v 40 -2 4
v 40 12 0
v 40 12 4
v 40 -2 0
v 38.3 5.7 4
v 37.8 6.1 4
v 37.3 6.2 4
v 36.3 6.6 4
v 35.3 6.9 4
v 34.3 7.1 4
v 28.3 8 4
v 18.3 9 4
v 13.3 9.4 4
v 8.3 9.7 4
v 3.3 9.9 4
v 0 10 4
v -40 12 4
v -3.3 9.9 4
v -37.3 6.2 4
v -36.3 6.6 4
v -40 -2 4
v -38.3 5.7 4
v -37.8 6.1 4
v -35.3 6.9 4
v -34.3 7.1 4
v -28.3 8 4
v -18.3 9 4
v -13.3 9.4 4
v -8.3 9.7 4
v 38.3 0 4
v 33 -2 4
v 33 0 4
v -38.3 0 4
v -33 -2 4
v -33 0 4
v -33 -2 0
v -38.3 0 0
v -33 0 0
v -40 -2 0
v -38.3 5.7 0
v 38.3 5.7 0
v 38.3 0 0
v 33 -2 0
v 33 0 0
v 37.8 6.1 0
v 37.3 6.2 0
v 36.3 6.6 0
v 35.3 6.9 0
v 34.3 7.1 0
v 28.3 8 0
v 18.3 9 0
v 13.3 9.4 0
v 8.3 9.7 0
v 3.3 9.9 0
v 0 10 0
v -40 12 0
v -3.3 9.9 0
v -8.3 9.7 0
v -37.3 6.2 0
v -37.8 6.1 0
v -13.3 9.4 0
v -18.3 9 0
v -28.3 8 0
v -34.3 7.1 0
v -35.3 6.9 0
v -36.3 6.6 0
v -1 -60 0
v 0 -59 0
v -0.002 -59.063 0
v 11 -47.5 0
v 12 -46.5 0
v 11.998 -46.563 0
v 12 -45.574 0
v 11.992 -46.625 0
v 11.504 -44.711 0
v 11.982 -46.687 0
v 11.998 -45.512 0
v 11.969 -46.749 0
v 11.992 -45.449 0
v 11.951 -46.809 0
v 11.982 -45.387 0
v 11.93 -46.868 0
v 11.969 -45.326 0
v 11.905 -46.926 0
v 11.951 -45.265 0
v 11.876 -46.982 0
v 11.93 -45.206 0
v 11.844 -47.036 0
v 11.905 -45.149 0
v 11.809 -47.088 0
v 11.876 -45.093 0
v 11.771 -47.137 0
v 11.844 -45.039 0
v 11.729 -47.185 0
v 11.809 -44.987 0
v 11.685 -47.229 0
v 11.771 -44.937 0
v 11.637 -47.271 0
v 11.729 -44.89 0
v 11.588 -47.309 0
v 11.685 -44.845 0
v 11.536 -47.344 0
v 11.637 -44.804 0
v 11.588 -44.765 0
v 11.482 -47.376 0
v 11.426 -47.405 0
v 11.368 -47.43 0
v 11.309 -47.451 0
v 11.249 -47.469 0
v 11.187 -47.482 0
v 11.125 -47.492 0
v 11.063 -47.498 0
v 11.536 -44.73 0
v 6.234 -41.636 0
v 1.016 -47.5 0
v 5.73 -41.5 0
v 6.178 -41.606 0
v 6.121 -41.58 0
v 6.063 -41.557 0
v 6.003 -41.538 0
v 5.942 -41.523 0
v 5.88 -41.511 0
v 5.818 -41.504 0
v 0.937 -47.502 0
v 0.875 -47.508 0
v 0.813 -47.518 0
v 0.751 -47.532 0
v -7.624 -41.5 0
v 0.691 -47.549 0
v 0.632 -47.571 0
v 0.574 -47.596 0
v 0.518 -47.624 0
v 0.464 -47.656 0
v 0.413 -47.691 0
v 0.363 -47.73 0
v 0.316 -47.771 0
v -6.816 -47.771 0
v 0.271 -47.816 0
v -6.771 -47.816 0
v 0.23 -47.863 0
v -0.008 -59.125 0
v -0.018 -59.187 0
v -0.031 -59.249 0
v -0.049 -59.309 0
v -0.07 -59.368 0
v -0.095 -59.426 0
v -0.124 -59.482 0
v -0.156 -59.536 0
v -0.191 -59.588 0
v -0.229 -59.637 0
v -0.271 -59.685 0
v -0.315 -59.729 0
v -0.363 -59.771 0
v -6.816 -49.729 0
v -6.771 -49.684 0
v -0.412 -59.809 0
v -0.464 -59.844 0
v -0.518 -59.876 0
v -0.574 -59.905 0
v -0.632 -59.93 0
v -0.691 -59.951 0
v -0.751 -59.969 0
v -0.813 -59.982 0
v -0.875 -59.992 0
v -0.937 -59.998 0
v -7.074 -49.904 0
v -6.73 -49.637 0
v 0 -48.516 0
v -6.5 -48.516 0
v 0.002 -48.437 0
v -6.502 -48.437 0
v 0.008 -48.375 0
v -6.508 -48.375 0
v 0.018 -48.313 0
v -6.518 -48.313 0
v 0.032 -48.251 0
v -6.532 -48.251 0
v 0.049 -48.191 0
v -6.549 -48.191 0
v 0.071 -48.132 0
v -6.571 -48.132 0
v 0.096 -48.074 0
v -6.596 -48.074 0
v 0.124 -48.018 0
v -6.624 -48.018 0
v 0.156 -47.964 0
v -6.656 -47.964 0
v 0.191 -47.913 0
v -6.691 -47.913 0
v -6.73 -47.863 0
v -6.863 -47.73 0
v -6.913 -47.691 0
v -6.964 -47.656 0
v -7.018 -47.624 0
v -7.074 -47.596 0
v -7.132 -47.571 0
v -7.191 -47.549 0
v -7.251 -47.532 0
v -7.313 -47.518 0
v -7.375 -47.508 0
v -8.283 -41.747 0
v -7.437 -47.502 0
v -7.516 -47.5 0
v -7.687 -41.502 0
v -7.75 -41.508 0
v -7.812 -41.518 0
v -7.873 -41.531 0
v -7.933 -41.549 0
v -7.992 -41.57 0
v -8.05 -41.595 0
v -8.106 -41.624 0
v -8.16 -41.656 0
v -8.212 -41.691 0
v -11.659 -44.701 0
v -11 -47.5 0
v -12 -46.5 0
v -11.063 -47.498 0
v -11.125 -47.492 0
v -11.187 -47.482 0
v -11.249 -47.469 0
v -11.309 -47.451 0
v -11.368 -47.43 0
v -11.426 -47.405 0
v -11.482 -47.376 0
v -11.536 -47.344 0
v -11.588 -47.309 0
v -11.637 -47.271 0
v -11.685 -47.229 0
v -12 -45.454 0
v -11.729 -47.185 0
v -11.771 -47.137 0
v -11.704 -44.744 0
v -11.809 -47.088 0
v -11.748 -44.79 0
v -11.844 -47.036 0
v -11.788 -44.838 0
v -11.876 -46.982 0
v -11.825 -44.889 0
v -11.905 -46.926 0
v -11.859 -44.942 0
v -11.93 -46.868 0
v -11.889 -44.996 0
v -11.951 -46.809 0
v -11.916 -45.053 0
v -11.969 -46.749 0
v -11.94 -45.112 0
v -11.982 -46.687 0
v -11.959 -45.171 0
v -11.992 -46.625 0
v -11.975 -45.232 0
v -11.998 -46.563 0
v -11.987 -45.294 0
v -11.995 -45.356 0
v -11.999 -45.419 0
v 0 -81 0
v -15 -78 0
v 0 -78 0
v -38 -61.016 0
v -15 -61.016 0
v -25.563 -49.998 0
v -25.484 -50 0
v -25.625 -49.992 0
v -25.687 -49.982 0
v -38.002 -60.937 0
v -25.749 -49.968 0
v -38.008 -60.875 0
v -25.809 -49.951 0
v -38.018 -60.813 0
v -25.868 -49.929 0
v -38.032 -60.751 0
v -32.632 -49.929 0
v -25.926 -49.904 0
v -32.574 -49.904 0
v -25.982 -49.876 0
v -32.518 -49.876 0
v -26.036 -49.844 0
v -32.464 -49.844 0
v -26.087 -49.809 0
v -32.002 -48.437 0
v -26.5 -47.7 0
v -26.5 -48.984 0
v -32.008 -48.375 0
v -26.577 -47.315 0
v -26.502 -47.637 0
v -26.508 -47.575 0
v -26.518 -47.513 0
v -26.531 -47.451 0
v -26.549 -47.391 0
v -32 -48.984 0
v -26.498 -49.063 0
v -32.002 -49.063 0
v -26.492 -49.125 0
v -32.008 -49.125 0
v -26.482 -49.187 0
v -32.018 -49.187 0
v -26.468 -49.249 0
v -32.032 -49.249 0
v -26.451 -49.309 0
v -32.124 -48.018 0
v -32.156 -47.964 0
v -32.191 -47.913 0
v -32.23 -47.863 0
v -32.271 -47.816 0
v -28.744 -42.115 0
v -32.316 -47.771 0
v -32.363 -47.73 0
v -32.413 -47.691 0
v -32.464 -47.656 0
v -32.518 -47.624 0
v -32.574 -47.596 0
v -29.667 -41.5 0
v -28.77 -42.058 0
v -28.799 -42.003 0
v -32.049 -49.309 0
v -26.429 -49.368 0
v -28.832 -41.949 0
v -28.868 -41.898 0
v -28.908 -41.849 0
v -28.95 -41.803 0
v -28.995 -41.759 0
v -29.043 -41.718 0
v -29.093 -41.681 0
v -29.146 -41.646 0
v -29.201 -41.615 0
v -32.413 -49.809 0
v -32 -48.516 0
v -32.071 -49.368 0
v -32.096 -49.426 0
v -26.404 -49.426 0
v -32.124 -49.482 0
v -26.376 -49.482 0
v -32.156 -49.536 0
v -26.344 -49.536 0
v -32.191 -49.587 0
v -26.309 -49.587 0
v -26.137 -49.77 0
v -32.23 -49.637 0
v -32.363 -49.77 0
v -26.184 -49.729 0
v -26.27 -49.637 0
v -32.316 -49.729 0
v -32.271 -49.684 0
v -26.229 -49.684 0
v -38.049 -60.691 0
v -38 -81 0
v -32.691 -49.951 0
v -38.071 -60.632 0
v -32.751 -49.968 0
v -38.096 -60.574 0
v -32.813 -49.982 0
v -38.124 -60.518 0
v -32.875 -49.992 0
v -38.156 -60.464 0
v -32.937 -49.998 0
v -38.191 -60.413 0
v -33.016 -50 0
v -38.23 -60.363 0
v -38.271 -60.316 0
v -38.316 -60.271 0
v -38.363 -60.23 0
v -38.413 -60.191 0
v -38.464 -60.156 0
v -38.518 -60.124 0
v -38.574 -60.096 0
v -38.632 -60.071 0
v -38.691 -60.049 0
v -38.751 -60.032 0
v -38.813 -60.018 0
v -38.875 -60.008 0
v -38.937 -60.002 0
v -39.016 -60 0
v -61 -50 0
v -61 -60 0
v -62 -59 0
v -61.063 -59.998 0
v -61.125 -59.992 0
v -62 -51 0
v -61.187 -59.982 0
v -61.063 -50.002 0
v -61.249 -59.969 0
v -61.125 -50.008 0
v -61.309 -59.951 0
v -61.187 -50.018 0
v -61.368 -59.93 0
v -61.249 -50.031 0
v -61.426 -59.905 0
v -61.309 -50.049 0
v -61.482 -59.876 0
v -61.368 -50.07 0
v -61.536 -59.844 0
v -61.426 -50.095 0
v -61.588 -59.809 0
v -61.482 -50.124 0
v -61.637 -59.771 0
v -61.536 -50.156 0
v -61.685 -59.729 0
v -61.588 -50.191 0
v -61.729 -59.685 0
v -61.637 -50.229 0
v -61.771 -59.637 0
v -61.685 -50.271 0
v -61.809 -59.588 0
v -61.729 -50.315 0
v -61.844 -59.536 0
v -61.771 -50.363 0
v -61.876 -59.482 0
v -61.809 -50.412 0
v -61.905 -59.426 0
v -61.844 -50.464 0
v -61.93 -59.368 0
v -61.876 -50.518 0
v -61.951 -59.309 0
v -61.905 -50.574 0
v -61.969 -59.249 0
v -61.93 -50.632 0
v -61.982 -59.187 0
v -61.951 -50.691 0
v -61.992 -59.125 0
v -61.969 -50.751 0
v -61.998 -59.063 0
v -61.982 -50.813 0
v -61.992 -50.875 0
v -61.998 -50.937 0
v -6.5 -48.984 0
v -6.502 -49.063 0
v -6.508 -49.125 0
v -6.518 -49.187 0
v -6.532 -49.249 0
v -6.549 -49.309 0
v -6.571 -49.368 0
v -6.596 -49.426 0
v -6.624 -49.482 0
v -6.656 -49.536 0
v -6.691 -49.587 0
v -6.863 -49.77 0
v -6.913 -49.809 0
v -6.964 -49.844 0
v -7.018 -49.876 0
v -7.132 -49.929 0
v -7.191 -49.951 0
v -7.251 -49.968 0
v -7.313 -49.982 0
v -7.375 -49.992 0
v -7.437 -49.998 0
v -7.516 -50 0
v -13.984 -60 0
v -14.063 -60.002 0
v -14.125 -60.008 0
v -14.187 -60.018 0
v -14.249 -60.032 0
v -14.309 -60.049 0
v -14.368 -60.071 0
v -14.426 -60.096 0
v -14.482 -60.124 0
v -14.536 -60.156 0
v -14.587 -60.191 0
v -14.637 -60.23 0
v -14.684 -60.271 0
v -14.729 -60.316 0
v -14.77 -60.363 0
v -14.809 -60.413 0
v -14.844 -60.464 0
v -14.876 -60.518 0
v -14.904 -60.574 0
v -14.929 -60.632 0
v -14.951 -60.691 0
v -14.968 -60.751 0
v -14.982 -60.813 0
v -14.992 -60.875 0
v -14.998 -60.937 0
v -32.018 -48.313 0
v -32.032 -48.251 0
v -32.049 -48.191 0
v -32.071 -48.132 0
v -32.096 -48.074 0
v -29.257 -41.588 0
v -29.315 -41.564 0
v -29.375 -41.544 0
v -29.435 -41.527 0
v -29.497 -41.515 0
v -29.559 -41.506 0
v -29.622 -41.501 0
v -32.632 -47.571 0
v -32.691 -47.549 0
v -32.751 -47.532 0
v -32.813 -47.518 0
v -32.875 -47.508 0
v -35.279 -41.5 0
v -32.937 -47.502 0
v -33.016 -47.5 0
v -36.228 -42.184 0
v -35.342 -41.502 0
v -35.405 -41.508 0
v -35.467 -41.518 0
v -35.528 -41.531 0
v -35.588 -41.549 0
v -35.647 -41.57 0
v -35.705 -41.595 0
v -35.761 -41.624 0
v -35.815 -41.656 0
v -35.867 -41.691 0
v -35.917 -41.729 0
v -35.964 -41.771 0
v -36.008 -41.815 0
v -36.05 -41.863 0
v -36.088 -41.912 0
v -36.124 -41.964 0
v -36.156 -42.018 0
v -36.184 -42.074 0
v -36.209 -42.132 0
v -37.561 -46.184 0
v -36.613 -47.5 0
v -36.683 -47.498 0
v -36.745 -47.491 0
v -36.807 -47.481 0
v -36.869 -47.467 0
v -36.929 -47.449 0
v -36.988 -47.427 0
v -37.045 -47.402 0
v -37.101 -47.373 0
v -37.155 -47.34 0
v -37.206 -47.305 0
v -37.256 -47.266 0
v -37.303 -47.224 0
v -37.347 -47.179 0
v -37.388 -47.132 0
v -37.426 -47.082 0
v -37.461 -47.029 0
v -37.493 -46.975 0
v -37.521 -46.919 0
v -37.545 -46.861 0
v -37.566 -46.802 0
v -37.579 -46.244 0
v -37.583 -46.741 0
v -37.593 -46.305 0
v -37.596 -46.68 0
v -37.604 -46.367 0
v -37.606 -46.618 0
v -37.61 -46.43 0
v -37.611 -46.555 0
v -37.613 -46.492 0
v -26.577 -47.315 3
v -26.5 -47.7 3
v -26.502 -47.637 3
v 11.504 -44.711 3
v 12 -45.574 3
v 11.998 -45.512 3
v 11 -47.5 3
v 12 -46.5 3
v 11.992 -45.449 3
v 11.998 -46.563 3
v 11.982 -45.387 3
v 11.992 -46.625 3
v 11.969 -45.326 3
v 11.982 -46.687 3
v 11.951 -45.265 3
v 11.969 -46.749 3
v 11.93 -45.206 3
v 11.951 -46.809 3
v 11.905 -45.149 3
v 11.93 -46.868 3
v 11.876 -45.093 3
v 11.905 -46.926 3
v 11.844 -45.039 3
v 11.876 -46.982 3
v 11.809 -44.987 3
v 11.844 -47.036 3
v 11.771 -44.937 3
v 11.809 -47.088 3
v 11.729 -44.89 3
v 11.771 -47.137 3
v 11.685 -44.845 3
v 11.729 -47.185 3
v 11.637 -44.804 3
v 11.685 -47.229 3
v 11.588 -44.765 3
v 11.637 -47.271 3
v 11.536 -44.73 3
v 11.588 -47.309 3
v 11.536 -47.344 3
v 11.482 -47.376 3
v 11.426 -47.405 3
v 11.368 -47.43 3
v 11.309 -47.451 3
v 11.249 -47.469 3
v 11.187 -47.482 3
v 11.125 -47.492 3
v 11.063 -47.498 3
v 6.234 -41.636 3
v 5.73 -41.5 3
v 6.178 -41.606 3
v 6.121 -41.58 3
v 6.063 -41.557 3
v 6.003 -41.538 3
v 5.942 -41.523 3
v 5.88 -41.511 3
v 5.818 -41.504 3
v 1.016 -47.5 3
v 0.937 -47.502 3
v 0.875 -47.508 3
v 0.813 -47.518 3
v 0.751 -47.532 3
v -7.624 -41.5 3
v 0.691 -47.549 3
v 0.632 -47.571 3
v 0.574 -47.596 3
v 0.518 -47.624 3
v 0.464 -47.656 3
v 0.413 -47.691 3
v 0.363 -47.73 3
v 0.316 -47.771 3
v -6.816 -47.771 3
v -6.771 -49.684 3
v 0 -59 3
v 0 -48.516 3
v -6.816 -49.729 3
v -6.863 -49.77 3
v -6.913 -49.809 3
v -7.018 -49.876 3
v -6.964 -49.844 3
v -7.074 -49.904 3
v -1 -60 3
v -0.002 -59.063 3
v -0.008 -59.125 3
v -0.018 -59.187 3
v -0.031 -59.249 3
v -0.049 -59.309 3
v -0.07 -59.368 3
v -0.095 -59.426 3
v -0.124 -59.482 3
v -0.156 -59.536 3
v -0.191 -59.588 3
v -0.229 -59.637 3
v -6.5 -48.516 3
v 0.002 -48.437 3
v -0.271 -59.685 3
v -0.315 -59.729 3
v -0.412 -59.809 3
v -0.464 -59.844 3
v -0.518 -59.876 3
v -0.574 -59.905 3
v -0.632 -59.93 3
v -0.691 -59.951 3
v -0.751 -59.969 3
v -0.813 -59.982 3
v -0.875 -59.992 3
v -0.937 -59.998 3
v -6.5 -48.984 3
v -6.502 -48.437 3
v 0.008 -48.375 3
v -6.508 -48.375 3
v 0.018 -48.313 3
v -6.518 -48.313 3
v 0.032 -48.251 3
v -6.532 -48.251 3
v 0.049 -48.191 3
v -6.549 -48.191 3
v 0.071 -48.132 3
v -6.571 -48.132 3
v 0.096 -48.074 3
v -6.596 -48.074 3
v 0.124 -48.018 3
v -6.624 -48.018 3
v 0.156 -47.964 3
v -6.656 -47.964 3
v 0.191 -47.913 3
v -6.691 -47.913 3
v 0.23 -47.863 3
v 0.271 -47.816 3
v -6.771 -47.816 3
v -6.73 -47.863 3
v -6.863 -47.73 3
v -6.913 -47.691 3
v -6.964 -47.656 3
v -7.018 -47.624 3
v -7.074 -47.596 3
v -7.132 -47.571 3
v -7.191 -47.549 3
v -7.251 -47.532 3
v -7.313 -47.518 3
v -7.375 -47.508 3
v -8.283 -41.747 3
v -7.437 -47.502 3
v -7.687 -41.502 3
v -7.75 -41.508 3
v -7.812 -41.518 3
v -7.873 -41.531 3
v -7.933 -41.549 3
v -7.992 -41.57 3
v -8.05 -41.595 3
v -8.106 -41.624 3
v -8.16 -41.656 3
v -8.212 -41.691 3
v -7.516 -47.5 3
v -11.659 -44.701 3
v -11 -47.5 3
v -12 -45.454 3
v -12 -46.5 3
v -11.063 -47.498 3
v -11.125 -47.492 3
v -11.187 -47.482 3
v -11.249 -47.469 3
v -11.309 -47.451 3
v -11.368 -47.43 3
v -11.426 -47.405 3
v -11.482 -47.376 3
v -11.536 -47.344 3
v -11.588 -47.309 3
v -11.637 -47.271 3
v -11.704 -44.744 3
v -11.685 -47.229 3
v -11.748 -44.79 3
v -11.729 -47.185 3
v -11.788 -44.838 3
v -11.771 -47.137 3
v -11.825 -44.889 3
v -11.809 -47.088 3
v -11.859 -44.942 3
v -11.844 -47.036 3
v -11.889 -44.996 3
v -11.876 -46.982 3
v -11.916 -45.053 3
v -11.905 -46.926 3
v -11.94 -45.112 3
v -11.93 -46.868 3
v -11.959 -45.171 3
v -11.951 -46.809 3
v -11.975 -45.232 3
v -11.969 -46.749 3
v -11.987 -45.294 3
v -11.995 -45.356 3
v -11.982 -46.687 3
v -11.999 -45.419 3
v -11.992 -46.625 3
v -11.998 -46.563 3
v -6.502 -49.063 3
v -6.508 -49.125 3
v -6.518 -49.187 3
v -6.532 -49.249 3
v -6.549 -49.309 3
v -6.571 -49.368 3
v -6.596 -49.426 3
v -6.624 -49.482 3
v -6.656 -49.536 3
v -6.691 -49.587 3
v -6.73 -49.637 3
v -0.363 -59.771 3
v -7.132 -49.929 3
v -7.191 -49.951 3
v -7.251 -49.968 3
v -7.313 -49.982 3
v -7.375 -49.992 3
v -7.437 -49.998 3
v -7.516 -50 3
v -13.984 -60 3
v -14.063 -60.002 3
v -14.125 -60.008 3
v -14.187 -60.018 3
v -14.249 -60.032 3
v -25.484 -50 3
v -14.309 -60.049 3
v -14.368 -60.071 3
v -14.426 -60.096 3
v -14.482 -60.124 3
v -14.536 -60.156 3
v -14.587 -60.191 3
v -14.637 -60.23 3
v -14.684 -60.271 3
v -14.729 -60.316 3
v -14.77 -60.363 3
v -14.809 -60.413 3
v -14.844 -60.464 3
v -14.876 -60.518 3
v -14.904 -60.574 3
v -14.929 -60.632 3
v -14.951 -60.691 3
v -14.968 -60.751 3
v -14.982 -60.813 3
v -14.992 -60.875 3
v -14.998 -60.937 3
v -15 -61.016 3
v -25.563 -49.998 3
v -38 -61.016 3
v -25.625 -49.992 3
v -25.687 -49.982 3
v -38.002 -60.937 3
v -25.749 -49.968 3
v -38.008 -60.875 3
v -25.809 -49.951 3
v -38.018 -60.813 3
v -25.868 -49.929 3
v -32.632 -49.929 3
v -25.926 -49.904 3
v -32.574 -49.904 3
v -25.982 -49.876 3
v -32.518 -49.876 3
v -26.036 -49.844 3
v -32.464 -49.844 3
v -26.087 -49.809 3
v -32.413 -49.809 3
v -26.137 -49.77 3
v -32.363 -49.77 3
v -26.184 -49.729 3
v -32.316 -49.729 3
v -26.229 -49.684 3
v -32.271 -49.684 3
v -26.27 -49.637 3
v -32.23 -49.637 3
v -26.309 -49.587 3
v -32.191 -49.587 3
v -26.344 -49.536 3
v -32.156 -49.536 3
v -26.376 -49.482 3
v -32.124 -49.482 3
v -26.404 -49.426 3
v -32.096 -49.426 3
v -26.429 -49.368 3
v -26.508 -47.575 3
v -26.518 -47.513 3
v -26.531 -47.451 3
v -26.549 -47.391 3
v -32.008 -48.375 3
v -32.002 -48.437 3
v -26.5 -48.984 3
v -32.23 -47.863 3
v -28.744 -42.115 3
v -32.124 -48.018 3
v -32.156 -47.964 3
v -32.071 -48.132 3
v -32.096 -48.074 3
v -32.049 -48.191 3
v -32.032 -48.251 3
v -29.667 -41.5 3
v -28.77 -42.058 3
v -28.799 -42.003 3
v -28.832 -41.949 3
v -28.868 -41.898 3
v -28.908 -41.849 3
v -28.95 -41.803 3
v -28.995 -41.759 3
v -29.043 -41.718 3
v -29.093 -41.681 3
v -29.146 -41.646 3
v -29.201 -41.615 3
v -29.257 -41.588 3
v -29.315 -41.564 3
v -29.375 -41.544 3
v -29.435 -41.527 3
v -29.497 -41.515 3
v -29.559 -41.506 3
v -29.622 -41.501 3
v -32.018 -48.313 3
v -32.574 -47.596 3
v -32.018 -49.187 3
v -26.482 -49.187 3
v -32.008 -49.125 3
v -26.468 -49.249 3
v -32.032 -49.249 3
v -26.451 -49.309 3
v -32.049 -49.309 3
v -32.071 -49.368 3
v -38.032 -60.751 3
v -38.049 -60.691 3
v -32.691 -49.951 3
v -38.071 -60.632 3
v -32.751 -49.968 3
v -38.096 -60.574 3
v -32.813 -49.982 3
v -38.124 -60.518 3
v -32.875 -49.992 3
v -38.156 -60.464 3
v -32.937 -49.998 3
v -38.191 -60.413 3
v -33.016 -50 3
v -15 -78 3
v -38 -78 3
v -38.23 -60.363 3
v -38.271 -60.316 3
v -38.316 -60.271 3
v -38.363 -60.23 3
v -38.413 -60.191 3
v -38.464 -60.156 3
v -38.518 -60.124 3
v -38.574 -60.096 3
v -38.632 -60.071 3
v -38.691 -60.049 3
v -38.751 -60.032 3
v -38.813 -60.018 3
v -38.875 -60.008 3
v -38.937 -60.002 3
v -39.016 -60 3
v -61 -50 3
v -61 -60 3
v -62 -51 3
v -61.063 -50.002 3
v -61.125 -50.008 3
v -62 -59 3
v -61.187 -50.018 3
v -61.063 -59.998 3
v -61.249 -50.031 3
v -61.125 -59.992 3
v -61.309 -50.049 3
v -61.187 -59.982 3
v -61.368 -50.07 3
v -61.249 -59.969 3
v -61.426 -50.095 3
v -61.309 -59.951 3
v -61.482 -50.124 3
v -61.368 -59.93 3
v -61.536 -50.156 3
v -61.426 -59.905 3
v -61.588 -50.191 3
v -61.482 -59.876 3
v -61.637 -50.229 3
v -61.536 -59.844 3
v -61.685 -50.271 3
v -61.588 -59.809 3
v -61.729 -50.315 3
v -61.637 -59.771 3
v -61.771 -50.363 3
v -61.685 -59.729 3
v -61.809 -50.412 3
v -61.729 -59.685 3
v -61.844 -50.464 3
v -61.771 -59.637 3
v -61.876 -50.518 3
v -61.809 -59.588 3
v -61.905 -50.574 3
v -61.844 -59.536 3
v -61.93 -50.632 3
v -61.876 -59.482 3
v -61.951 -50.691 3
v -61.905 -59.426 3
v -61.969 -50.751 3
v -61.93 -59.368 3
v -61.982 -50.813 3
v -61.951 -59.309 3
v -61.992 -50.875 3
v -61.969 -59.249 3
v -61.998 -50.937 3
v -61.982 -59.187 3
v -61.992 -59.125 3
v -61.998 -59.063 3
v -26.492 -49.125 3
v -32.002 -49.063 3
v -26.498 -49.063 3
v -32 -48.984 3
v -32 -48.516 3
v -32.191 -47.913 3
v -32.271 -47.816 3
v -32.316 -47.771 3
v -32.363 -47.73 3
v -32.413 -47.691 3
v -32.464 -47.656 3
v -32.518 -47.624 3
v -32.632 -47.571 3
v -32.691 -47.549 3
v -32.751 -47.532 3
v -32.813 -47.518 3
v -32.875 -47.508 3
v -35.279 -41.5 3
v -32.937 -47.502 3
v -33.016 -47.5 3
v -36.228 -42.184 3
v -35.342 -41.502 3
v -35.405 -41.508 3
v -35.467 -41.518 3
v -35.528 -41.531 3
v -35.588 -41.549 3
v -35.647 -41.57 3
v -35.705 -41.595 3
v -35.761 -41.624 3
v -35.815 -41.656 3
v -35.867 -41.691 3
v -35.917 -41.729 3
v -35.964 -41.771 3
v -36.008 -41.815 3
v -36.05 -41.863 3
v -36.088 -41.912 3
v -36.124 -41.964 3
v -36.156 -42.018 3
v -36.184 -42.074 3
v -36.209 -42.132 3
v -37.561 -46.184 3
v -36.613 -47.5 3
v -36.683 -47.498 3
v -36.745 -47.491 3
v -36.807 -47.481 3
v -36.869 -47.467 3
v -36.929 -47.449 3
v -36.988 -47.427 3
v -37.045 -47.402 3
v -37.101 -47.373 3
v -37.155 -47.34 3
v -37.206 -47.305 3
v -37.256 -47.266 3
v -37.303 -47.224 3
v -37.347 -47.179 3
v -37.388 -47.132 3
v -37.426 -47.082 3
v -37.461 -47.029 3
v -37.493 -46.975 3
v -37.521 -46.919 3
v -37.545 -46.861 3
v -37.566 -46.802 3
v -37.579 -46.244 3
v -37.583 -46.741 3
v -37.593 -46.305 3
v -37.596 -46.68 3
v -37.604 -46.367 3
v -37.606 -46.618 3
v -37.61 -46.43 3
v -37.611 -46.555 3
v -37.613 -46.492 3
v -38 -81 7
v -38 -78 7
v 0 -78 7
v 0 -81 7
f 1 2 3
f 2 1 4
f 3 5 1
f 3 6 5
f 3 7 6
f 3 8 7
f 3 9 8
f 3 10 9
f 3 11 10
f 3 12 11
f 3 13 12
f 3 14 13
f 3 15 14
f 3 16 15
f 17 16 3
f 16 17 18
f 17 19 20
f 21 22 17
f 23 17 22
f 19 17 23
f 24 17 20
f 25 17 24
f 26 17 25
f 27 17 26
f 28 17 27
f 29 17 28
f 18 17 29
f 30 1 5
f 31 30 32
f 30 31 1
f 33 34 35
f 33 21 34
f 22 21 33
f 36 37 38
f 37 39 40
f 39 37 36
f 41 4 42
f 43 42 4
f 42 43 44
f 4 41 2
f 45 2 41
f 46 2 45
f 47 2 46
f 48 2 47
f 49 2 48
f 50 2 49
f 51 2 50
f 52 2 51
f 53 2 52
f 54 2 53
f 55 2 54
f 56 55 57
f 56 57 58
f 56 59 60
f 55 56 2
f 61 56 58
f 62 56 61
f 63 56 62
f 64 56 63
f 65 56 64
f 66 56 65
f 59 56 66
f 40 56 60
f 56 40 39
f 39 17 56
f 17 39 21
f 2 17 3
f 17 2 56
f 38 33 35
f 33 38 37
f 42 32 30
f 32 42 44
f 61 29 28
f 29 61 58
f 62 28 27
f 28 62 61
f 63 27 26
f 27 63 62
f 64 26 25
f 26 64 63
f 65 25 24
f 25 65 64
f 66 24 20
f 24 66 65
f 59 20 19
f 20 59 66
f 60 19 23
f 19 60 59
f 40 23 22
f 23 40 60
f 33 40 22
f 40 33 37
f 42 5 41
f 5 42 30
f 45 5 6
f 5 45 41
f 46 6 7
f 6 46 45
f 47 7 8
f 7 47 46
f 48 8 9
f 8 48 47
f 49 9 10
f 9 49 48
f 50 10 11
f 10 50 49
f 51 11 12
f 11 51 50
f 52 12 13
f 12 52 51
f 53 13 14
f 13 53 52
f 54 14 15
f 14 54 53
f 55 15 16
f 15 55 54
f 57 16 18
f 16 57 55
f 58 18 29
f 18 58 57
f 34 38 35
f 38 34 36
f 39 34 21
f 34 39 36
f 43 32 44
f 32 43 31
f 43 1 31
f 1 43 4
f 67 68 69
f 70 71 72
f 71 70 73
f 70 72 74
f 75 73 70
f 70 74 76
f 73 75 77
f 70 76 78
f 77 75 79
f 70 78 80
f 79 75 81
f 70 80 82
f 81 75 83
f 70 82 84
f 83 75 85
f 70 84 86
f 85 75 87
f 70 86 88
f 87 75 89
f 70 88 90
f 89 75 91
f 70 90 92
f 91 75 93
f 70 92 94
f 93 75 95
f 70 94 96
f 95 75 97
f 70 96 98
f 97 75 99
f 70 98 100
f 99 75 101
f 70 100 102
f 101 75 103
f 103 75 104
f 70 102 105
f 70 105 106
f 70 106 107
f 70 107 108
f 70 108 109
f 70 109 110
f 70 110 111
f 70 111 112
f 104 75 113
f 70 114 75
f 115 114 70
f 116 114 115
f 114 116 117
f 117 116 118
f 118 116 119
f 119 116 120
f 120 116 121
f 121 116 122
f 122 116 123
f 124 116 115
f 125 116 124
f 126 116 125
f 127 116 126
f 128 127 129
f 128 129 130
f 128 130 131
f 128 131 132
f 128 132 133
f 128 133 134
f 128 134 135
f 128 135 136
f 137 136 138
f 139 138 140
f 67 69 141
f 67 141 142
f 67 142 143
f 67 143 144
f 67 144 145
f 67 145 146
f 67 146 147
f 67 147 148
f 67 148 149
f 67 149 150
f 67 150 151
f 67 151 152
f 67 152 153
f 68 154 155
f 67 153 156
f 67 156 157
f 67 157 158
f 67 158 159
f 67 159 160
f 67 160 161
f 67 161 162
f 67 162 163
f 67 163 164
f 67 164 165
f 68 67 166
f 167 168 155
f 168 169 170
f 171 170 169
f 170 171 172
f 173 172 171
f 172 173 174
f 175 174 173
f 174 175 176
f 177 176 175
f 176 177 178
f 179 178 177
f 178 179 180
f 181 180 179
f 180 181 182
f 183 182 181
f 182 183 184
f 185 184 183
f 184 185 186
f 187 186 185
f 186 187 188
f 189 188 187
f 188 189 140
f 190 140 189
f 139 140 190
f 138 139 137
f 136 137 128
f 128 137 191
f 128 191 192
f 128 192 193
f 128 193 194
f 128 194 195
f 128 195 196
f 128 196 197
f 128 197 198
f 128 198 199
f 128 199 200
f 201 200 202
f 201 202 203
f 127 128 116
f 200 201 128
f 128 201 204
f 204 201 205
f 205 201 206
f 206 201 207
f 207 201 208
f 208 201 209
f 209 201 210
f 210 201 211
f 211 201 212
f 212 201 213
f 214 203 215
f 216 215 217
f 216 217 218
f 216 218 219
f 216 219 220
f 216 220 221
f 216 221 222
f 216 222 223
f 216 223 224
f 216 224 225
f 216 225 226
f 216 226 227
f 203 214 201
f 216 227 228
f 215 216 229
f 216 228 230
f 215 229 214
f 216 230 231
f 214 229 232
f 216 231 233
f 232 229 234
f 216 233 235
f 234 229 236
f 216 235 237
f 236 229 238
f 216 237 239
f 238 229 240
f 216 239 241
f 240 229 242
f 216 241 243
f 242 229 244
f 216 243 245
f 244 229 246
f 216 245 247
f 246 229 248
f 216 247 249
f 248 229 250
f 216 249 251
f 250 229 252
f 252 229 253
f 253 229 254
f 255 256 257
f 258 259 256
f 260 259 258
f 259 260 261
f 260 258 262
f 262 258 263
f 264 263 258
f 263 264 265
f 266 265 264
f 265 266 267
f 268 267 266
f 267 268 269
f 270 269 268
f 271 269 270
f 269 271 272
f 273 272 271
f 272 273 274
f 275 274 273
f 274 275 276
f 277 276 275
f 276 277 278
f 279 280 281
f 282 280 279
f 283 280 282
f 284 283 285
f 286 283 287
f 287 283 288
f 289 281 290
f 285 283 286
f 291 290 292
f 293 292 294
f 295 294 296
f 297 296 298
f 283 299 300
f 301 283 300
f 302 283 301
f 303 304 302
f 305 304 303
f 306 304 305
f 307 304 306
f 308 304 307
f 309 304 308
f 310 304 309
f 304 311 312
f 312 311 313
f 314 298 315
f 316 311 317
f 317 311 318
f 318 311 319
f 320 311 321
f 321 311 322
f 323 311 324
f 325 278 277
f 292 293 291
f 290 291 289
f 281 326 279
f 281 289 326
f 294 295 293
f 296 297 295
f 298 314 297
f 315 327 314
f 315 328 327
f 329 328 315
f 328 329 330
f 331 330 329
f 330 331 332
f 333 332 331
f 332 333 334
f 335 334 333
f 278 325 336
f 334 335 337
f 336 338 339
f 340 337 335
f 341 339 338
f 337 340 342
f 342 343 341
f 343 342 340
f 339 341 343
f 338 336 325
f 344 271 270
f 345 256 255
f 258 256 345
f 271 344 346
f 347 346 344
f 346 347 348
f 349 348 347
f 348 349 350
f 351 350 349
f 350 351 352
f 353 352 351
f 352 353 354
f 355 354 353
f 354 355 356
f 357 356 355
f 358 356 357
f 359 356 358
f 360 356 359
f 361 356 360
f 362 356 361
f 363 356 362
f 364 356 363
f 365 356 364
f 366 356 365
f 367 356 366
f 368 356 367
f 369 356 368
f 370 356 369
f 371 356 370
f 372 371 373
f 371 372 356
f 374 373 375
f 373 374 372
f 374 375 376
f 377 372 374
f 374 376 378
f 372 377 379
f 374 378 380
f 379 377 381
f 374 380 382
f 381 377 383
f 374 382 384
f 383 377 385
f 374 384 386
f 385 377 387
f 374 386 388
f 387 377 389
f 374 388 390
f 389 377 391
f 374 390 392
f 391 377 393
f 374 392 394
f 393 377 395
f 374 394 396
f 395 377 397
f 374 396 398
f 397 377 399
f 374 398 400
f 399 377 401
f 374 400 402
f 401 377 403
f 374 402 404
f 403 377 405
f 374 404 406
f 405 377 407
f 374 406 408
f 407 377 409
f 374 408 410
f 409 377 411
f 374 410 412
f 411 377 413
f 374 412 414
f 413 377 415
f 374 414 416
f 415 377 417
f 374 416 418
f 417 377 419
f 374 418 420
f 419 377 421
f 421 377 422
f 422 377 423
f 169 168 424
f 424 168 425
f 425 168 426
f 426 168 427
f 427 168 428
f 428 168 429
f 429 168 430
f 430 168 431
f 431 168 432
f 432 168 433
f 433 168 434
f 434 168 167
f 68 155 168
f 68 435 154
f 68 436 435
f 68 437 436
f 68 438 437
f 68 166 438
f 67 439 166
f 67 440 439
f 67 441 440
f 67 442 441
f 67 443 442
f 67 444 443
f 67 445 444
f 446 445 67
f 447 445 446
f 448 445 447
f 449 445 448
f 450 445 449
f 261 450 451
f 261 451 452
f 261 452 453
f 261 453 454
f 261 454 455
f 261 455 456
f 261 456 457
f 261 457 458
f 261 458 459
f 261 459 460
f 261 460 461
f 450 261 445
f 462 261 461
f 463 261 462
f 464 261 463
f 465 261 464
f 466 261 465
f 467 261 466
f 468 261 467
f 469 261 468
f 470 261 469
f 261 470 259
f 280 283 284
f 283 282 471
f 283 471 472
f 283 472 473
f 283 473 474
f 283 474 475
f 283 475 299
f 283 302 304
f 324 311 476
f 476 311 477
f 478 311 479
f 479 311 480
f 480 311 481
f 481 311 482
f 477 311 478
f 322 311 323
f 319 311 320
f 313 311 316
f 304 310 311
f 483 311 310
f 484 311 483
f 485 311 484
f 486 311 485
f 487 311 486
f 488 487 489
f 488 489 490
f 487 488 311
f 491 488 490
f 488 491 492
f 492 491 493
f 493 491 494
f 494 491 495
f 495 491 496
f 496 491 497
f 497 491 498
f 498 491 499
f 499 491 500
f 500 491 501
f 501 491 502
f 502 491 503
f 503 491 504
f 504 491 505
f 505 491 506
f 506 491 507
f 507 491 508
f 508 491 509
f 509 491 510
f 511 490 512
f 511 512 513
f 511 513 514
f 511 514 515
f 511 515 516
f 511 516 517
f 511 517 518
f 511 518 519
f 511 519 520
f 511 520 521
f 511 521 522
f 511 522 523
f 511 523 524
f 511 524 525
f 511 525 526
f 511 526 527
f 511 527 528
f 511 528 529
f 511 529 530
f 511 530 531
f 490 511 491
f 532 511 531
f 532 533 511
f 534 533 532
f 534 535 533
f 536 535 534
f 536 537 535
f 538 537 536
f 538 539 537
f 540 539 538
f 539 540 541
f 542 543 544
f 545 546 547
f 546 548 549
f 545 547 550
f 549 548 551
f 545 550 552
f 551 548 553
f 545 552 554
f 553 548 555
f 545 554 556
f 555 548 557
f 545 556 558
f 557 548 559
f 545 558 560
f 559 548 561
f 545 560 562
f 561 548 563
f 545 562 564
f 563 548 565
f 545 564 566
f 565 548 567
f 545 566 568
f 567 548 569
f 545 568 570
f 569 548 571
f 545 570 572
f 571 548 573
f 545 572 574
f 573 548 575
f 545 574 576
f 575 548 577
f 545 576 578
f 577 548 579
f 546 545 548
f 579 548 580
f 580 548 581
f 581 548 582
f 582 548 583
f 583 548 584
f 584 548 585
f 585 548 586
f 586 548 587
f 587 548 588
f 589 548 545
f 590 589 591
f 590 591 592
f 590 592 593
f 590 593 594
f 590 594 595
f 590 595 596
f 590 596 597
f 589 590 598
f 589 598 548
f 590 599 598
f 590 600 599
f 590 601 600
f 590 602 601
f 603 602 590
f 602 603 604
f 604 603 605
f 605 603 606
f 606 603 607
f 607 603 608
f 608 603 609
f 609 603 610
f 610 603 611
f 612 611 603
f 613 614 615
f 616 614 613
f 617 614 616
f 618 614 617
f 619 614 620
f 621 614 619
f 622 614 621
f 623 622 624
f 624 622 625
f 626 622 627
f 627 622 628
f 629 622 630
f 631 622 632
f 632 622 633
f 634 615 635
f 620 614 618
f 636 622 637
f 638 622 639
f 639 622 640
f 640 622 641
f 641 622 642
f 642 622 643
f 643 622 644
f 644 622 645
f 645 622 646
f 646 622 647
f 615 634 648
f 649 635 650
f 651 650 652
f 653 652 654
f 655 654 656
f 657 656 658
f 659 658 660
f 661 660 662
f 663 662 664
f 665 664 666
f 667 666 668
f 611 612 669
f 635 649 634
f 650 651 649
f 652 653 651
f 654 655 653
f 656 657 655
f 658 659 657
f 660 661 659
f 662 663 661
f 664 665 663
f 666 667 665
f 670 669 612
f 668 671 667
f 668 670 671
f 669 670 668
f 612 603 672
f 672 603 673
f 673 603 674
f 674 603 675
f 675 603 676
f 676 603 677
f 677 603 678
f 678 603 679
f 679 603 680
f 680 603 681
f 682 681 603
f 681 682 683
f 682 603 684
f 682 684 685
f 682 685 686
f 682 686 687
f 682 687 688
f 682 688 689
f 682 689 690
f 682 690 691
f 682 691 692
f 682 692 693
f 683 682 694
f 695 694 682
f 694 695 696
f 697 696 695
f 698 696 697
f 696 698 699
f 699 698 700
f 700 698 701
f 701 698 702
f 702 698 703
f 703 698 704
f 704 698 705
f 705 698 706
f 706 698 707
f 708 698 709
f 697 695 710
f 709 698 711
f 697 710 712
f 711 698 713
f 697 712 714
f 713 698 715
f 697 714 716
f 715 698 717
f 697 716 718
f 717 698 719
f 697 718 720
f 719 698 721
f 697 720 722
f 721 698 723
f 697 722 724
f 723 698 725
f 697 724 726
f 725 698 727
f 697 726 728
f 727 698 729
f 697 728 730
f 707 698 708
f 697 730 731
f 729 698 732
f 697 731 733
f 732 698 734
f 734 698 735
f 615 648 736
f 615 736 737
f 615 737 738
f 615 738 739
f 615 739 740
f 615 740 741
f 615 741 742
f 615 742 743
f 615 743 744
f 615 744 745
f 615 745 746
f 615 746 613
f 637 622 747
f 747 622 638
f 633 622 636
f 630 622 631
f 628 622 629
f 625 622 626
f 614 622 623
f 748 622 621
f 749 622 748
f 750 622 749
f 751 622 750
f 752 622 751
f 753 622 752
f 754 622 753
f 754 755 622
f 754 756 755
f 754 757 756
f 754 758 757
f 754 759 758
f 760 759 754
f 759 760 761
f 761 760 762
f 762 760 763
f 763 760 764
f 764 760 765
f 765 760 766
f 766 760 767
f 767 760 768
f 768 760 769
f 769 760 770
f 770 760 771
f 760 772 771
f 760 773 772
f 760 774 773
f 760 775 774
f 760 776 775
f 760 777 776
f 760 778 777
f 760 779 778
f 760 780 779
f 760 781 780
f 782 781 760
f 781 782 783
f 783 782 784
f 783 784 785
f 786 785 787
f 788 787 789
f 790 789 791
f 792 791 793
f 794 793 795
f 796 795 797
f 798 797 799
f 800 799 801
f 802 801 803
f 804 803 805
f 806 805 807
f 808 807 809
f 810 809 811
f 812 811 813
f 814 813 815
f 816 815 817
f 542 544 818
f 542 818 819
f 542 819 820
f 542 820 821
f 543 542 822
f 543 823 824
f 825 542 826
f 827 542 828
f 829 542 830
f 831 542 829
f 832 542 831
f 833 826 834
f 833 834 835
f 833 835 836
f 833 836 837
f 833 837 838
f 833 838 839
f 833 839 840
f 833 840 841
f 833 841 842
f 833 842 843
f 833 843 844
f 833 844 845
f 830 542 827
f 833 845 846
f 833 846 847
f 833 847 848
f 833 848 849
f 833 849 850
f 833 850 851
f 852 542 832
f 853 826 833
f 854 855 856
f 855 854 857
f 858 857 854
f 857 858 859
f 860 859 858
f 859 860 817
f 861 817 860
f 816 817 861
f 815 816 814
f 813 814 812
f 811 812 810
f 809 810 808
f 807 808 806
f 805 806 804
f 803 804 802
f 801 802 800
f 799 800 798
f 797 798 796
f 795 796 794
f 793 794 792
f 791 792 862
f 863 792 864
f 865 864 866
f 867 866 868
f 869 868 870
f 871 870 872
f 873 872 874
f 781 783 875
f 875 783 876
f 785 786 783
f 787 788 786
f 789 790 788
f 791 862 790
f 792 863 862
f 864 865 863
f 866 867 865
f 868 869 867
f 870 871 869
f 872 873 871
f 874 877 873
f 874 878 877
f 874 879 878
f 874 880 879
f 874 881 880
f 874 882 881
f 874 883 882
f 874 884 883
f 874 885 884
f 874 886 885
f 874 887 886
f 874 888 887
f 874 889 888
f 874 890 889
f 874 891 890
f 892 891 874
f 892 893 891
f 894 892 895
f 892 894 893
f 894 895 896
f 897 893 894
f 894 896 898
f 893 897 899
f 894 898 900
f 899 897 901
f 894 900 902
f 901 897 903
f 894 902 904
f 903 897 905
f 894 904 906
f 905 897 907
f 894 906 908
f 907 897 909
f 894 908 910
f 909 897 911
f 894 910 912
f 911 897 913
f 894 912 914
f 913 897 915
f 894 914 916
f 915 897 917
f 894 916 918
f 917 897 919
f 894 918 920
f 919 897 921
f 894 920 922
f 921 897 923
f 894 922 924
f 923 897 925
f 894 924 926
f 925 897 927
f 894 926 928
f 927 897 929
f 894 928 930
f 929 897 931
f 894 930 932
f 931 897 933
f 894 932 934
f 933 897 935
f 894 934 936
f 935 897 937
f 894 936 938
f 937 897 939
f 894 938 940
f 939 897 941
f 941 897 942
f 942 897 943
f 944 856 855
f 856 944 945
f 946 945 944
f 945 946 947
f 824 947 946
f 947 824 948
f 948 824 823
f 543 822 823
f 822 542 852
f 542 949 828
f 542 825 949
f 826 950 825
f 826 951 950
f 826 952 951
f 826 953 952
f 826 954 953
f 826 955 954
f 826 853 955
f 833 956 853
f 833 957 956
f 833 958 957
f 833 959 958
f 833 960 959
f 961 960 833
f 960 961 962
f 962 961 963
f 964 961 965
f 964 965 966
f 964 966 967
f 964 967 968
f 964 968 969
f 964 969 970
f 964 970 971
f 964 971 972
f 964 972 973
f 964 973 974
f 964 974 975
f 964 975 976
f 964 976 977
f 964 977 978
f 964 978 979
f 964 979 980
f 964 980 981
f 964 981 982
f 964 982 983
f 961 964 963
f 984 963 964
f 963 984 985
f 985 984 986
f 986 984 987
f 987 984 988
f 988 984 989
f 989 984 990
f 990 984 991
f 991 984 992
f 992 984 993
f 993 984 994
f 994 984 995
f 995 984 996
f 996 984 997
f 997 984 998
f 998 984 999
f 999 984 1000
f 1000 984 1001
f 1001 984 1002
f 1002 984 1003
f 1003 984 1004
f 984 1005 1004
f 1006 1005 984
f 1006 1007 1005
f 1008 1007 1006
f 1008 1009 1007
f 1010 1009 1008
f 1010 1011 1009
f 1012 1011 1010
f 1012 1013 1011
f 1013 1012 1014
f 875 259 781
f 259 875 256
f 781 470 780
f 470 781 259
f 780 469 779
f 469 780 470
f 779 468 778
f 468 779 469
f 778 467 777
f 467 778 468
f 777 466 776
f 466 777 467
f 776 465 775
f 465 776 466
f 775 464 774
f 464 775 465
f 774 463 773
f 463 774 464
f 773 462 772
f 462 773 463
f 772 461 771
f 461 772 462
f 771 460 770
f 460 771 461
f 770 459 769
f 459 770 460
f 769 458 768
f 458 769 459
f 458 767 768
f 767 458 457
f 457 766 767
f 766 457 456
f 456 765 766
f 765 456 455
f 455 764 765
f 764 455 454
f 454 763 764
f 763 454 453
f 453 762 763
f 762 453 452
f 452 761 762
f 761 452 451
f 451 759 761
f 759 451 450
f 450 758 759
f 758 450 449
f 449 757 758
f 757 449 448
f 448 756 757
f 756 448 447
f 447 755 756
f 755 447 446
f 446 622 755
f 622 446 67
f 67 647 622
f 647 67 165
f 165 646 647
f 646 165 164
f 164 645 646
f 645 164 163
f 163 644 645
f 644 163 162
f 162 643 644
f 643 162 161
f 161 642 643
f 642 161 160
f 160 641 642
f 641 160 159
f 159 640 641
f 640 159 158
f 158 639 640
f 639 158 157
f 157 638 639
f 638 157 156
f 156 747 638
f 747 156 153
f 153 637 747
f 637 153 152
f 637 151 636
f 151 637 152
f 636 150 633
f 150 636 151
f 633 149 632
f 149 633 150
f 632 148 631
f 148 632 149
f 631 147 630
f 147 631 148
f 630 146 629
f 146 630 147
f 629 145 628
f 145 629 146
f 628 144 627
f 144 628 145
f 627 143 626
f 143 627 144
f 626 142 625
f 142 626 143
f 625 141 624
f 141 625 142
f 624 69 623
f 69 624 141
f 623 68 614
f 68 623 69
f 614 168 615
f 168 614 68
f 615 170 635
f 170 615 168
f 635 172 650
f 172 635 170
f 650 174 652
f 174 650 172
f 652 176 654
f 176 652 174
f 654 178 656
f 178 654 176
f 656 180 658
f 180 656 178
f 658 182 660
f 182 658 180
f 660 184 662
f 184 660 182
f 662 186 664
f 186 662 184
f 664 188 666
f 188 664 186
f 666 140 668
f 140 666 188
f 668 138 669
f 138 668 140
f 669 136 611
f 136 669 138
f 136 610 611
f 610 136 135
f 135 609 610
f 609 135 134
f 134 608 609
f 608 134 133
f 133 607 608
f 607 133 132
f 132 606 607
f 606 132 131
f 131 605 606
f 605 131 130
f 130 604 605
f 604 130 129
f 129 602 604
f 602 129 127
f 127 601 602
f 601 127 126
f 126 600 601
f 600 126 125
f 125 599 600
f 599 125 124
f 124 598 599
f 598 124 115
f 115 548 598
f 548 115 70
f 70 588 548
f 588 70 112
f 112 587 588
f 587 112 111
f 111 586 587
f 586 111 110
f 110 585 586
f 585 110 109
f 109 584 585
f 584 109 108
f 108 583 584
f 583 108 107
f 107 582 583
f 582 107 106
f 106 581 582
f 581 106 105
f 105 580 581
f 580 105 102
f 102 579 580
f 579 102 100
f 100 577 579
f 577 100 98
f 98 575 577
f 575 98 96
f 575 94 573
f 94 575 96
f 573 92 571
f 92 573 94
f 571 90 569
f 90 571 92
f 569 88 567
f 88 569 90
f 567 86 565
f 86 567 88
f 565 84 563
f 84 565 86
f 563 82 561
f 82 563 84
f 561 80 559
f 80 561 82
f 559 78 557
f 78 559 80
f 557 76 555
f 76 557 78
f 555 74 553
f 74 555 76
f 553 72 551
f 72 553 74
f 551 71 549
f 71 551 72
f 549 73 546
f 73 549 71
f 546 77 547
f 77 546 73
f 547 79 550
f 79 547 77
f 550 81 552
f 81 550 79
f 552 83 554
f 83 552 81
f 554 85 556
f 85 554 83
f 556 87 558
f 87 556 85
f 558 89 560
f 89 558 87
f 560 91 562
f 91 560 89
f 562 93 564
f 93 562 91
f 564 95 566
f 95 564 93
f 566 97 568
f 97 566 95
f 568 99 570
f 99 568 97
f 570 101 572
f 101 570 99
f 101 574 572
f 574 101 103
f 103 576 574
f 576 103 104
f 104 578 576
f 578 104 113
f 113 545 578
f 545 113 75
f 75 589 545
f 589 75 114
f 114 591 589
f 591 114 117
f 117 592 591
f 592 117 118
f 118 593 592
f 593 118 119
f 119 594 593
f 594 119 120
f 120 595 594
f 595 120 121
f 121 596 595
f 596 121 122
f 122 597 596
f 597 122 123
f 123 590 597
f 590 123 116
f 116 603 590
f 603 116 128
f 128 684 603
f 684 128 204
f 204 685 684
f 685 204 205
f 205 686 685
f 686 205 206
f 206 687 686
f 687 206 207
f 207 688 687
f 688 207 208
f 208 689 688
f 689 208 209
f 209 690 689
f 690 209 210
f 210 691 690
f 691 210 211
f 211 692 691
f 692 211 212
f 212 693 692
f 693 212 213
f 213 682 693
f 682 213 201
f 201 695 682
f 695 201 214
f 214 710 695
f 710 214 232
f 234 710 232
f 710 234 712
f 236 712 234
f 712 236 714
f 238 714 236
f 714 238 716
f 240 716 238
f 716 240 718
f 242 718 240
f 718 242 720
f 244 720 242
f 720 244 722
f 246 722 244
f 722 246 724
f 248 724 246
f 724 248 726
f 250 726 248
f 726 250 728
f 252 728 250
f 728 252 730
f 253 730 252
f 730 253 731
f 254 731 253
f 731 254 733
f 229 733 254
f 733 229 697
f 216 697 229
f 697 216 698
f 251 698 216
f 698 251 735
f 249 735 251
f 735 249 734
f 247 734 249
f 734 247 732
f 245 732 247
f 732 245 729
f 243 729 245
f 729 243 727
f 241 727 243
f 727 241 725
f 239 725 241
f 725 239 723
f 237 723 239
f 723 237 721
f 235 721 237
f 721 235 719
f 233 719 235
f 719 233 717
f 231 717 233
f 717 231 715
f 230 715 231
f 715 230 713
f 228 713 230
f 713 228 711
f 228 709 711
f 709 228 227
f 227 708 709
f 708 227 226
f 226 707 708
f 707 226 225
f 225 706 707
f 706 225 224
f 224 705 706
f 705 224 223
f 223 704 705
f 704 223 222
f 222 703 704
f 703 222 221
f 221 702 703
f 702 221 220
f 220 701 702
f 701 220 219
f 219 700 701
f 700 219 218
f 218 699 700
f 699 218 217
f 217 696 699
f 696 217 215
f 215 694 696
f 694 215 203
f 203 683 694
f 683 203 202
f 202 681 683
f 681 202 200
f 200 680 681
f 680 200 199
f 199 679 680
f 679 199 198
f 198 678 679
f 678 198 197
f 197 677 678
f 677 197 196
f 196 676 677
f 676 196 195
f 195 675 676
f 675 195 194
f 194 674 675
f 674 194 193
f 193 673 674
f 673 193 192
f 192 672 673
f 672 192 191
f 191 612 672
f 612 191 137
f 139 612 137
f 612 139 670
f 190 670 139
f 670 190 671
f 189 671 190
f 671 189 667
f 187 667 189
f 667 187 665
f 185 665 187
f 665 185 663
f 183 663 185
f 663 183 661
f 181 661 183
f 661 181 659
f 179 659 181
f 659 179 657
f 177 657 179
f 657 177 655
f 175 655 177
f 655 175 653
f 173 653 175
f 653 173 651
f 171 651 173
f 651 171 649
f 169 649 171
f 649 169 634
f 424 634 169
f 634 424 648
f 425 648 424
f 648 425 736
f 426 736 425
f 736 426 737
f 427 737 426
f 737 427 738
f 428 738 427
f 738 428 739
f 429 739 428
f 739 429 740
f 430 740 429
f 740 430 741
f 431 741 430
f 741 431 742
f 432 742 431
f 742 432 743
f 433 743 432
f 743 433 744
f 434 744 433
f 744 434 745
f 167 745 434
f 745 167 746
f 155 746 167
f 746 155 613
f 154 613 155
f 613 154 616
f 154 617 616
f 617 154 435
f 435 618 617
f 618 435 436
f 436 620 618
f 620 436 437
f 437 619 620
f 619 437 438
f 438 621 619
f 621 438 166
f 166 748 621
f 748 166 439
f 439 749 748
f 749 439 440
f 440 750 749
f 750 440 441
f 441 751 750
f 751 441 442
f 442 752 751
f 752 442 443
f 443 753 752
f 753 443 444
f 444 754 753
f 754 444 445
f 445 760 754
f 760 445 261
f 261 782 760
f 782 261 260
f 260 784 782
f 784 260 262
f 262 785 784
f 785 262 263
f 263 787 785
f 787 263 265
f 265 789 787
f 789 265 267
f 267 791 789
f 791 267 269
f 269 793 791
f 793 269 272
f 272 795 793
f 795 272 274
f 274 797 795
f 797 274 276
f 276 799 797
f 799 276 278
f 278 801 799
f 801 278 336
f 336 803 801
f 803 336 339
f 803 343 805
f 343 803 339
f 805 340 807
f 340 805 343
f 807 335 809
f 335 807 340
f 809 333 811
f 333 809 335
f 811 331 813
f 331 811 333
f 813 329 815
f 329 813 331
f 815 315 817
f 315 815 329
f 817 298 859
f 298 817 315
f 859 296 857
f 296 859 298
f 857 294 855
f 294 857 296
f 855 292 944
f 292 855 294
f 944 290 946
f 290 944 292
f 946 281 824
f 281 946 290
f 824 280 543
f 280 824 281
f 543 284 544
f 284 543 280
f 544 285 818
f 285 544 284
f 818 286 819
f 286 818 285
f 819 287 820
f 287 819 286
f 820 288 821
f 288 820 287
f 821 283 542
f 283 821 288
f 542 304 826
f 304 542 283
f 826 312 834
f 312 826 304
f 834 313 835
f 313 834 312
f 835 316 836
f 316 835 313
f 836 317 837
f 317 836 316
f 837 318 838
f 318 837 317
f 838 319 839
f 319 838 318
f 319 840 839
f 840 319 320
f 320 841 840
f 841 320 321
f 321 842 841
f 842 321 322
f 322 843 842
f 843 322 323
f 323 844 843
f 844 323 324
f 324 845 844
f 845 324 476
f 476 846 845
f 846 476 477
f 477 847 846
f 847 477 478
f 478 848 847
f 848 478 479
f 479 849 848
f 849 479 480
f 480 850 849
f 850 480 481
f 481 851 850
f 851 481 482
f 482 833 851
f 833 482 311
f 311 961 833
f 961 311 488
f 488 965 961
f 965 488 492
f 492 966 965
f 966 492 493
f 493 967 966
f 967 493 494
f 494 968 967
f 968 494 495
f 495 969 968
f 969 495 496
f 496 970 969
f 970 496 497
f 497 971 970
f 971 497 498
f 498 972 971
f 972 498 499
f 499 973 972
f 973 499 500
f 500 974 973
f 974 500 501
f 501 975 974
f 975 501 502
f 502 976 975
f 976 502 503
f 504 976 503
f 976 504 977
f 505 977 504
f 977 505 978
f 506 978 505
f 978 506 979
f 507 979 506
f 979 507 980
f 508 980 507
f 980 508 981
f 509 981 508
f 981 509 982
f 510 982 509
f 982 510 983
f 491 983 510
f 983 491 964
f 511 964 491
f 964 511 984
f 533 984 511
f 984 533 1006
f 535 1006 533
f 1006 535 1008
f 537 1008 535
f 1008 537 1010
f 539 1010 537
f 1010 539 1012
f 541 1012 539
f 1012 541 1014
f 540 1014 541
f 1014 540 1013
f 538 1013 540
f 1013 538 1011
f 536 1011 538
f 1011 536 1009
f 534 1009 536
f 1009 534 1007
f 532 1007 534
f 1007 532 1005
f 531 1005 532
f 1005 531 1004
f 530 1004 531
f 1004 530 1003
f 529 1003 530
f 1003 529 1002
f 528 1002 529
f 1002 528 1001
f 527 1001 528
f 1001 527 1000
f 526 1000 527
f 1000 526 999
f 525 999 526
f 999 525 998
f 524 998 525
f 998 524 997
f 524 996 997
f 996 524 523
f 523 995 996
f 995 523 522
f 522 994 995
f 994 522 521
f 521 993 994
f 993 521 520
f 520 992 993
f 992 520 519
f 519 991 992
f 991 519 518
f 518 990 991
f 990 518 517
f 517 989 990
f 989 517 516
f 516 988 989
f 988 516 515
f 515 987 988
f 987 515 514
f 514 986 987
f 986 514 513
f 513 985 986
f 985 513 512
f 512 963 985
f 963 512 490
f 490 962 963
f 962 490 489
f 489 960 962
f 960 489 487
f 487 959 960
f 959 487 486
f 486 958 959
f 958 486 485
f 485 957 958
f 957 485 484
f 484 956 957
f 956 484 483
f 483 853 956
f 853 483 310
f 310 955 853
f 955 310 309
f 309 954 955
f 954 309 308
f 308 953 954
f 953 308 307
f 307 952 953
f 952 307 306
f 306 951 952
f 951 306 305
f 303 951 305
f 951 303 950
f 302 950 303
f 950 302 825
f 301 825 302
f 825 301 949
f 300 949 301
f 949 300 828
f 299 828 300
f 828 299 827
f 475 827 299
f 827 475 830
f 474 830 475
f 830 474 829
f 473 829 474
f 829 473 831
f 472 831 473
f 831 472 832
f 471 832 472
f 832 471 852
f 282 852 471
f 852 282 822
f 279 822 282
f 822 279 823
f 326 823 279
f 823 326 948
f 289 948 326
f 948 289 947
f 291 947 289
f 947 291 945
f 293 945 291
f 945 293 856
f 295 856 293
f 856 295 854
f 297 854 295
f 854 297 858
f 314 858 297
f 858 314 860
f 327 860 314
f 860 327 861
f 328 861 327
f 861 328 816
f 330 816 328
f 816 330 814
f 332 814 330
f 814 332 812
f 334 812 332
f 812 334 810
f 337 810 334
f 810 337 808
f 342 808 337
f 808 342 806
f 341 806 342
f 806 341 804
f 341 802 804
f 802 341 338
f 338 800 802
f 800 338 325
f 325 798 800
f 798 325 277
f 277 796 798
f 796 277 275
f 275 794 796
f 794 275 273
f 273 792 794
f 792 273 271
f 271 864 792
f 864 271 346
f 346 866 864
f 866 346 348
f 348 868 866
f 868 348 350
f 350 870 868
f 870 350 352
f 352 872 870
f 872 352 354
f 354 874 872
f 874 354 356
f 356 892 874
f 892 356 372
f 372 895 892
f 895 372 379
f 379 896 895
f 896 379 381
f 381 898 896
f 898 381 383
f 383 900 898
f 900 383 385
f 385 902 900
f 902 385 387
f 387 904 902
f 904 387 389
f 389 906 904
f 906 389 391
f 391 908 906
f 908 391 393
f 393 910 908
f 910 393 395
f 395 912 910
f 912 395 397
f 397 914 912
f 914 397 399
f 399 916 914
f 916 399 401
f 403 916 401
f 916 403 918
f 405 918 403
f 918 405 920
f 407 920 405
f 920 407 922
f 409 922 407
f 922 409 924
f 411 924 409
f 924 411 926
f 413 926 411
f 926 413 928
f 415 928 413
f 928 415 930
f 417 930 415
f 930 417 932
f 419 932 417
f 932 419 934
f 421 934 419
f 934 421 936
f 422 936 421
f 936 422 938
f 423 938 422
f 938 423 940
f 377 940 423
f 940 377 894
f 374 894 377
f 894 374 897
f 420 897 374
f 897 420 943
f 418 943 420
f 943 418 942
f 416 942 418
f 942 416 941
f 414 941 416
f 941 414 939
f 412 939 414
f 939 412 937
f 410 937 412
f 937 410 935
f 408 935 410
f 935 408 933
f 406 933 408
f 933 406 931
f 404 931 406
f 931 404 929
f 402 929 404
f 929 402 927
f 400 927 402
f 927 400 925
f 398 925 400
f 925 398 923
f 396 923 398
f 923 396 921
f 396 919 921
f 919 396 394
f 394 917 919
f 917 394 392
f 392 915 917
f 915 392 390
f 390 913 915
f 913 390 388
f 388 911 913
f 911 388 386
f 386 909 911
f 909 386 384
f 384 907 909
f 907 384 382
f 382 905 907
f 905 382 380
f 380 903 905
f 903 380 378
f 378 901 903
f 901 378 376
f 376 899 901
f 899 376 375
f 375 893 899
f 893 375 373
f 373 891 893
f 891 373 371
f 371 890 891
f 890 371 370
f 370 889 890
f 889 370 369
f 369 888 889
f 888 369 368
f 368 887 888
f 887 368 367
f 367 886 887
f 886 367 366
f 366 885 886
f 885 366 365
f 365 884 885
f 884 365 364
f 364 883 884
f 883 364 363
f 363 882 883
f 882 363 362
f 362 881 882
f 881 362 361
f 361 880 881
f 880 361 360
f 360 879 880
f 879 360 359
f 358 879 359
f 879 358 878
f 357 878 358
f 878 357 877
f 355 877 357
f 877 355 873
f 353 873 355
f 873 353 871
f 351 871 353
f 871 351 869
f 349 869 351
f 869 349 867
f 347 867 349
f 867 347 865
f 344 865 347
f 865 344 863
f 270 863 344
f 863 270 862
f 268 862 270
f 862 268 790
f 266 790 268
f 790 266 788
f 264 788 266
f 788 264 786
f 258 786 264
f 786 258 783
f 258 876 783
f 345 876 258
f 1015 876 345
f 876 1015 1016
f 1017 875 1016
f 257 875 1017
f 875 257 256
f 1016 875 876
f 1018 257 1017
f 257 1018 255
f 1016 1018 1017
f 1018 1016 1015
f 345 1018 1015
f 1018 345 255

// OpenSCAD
// Examples

HayworthPremiseTop(4);

translate([0,-50,0])
HayworthPremiseWallInterface(3,30,3,7);

// This module makes a part that will fit on the top of a Hayworth 
// Premise cube partition.  Combine it with other designs to make
// items that hang off the top of the cube.
// Inputs: thickness is the height to which the 2D profile is extruded
// 
// Design by Keith Rogers

module  HayworthPremiseTop(thickness = 4)
{
    difference()
    {
        translate([-40,0,0])
        cube([80,12,thickness]);
    
    
    linear_extrude(thickness)
    {
        translate([38.3,0,0])mirror([1,0,0])
        polygon([[0,5.7],[0.5,6.1],[1,6.2],[2,6.6],[3,6.9],[4,7.1],[5,7.25],[10,8],[15,8.5],[20,9],[25,9.4],[30,9.7],[35,9.9],[38.3,10],[38.3,0],[0,0]],[[0,1,2,3,4,5,6,7,8,9,10,11,12,13,14,15]]);
        translate([-38.3,0,0])
            polygon([[0,5.7],[0.5,6.1],[1,6.2],[2,6.6],[3,6.9],[4,7.1],[5,7.25],[10,8],[15,8.5],[20,9],[25,9.4],[30,9.7],[35,9.9],[38.3,10],[38.3,0],[0,0]],[[0,1,2,3,4,5,6,7,8,9,10,11,12,13,14,15]]);
    }
    }
    translate([-40,-2,0])
    cube([7,2,thickness]);
    translate([33,-2,0])
    cube([7,2,thickness]);
}

// This module makes a part that will fit in the latticework between
// two Hayworth Premise cube partitions.  Combine it with other
// designs to make items that hang off the wall of the cube.
// Inputs: thickness relates to the space between partitions
//         hookOffset determines how far out from the wall the hook
//                    will be placed.
//         hookThickness is the width of the hook in the 
//                    direction coming out of the wall; set to 0 
//                    if no hook is desired.
//         hookWidth is the side-to-side dimension of the hook.
// Loosely derived from an interface piece provided by Hayworth.
// Design by Scott Gorin and Keith Rogers.

module HayworthPremiseWallInterface(thickness=3,hookOffset=30,hookThickness=3,hookWidth=10)

{
//Wall Connector

thickness = 3;
r = 2;
$fn=100;

union(){
    
linear_extrude(height=thickness)
offset(r=1){ 
    offset(r=-2){ 
        offset(r=1){
     polygon(points=[[-62,0],[-32,0],[-32,2.5],[-38,2.5],[-36,8.5],[-29,8.5],[-26.5,2.5],[-26.5,0],[-6.5,0],[-6.5,2.5],[-12,2.5],[-12,5],[-8,8.5],[6,8.5],[12,5],[12,2.5],[0,2.5],[0,-10],[-15,-10],[-15,-20],[-38,-20],[-38,-10],[-62,-10]]);
}}}

// offset cube
translate([-38,-hookOffset+r,0])cube([23,hookOffset-3,thickness]);
//upright bit
translate([-38,-hookOffset-hookThickness+r,0]) cube([38,hookThickness,hookWidth]);
}
}
